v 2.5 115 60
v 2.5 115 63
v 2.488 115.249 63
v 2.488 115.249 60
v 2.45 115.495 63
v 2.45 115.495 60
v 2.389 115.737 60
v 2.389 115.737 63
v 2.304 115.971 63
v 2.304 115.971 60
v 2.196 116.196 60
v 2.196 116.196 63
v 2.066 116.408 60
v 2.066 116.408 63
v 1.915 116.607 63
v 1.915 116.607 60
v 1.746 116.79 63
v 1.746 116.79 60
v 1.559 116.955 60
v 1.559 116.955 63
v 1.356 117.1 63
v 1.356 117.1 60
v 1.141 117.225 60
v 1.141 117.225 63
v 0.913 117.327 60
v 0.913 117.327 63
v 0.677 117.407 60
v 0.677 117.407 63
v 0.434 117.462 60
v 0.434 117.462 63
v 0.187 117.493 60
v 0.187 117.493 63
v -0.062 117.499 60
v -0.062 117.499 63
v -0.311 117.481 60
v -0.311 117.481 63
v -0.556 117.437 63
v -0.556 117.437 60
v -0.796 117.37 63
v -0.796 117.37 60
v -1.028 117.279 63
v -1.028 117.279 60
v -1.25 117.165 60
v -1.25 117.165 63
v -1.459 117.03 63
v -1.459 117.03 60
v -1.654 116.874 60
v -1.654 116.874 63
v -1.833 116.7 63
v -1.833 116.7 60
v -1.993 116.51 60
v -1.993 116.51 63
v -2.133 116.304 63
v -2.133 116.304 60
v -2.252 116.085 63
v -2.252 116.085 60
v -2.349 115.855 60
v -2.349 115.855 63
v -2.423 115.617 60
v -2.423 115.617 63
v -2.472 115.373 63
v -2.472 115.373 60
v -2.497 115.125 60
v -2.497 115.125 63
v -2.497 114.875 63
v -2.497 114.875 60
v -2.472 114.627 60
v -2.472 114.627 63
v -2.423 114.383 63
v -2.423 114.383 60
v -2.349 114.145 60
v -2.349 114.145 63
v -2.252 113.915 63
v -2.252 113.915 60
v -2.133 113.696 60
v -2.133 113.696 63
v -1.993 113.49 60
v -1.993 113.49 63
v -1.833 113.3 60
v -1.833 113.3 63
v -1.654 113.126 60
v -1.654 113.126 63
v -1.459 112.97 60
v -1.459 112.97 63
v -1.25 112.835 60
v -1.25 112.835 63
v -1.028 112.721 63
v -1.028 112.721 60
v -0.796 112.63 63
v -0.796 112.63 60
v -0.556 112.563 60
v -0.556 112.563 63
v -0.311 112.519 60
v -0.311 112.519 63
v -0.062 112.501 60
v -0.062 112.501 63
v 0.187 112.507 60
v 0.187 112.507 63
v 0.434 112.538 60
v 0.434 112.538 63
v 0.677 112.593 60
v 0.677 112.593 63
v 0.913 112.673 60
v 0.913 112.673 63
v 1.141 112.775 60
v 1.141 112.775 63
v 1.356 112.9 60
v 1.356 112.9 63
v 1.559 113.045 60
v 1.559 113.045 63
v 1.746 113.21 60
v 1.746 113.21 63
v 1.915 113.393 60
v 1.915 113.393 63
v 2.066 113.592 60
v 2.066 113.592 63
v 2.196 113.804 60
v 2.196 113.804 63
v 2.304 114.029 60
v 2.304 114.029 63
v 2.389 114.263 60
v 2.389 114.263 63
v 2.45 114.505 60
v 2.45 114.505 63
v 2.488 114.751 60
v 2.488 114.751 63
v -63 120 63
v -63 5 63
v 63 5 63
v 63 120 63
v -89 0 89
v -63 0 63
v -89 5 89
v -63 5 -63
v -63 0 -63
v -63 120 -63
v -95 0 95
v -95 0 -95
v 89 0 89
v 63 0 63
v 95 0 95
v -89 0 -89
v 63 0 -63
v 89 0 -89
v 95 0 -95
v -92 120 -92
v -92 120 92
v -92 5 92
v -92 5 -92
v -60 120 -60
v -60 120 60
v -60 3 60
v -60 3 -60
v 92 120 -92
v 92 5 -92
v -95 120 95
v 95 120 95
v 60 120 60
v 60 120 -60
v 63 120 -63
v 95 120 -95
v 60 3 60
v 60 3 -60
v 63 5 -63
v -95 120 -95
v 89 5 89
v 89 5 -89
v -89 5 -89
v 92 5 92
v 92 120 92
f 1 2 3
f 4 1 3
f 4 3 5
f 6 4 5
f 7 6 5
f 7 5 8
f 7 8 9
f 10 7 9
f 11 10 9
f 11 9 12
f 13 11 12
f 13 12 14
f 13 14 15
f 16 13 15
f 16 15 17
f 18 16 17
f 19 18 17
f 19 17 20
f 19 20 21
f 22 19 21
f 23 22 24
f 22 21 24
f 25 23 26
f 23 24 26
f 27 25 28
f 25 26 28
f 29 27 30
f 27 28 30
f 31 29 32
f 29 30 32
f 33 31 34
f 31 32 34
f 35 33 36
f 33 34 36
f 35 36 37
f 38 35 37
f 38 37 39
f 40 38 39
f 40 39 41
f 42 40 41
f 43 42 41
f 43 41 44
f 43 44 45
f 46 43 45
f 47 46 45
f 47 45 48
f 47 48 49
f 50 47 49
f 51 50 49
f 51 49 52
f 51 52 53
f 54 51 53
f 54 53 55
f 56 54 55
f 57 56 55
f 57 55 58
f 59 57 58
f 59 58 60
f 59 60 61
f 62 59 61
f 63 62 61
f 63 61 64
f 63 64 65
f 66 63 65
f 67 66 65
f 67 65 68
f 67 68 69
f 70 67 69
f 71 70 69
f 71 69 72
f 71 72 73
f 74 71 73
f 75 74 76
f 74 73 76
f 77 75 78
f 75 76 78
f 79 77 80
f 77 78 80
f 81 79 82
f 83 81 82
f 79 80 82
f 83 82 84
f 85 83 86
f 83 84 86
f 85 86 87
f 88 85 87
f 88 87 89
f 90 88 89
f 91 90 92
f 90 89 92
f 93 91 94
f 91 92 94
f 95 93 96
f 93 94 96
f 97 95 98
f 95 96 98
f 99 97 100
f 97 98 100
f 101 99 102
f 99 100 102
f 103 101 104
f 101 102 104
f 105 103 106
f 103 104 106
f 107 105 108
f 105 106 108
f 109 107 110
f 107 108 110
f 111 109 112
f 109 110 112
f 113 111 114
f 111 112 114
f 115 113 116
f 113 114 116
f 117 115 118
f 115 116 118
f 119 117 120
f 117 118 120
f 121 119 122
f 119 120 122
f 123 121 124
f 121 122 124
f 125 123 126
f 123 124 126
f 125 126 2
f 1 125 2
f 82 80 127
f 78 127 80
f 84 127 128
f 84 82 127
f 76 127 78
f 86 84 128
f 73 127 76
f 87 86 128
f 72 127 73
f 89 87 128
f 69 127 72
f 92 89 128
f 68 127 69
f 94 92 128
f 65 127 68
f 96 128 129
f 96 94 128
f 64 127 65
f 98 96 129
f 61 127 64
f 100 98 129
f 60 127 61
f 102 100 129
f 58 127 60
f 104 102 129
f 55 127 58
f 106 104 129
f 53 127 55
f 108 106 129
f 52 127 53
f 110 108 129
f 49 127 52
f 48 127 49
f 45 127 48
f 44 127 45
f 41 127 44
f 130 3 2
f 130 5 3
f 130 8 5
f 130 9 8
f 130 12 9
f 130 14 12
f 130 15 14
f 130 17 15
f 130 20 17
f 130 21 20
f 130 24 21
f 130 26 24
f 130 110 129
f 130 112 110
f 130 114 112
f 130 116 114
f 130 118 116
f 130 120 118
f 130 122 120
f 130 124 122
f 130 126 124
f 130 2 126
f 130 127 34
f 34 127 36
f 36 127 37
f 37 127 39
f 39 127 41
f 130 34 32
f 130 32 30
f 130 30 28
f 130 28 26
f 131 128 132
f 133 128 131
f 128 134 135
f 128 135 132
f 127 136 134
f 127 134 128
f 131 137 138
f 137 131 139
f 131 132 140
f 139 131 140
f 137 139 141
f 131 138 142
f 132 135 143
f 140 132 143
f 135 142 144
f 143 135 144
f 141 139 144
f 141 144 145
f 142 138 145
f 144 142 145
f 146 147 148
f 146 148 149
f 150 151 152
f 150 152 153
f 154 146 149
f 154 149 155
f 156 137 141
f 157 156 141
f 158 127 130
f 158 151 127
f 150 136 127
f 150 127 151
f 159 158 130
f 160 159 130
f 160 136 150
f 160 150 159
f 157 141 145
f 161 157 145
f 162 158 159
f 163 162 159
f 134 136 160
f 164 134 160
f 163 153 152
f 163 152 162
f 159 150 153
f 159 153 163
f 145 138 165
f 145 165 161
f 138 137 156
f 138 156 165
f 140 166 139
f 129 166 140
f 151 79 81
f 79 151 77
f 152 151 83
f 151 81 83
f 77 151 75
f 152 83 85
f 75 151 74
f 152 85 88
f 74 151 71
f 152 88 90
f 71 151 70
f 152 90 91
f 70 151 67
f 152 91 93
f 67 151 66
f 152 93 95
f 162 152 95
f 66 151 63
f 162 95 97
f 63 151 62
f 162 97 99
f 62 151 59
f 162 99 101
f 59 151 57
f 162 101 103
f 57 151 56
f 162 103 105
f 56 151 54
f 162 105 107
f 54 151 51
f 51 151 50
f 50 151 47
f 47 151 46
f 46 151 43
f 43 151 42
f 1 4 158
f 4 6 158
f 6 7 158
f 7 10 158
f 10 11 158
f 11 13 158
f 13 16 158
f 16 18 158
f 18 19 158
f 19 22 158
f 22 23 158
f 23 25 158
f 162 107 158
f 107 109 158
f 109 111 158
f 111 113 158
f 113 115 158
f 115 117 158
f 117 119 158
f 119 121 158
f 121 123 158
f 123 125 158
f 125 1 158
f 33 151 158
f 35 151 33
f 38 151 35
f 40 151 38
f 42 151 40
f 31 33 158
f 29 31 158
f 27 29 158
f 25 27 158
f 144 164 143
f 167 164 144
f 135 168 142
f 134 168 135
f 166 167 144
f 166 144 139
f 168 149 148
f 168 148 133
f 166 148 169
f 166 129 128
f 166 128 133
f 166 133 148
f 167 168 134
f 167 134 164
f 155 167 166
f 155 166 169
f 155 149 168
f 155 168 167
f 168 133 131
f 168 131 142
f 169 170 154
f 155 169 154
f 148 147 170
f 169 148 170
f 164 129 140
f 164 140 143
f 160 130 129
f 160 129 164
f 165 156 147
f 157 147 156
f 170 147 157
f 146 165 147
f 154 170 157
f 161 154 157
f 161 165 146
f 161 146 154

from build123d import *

# Parameters (mm, degrees)
SKETCH1_W           = 190
SKETCH1_H           = 190
BOSS_EXTRUDE1_DEPTH = 120
SKETCH2_W           = 120
SKETCH2_H           = 120
CUT_EXTRUDE1_DEPTH  = 117
SKETCH3_W           = 184
SKETCH3_H           = 184
SKETCH3_W_2         = 126
SKETCH3_H_2         = 126
CUT_EXTRUDE2_DEPTH  = 115
CUT_EXTRUDE3_DEPTH  = 53
SKETCH5_R           = 2.5
CUT_EXTRUDE4_DEPTH  = 17


with BuildPart() as part:
    # Sketch1 → Boss-Extrude1 (new body)
    with BuildSketch(Plane(origin=(0, 0, 0), x_dir=(1, 0, 0), z_dir=(0, 1, 0))):
        Rectangle(SKETCH1_W, SKETCH1_H)
    extrude(amount=BOSS_EXTRUDE1_DEPTH)

    # Sketch2 → Cut-Extrude1 (cut)
    with BuildSketch(Plane(origin=(0, 120, 0), x_dir=(1, 0, 0), z_dir=(0, 1, 0))):
        Rectangle(SKETCH2_W, SKETCH2_H)
    extrude(amount=-CUT_EXTRUDE1_DEPTH, mode=Mode.SUBTRACT)

    # Sketch3 → Cut-Extrude2 (cut)
    with BuildSketch(Plane(origin=(0, 120, 0), x_dir=(1, 0, 0), z_dir=(0, 1, 0))):
        Rectangle(SKETCH3_W, SKETCH3_H)
        Rectangle(SKETCH3_W_2, SKETCH3_H_2, mode=Mode.SUBTRACT)
    extrude(amount=-CUT_EXTRUDE2_DEPTH, mode=Mode.SUBTRACT)

    # Sketch4 → Cut-Extrude3 (cut)
    with BuildSketch(Plane(origin=(0, 5, 0), x_dir=(1, 0, 0), z_dir=(0, 1, 0))):
        Polygon((-89, -89), (-89, 89), (-63, 63), (-63, -63), align=None)
        Polygon((89, -89), (63, -63), (63, 63), (89, 89), align=None)
    extrude(amount=-CUT_EXTRUDE3_DEPTH, mode=Mode.SUBTRACT)

    # Sketch5 → Cut-Extrude4 (cut)
    with BuildSketch(Plane.XY.offset(63)):
        with Locations((0, 115)):
            Circle(SKETCH5_R)
    extrude(amount=-CUT_EXTRUDE4_DEPTH, mode=Mode.SUBTRACT)


solid = part.part
